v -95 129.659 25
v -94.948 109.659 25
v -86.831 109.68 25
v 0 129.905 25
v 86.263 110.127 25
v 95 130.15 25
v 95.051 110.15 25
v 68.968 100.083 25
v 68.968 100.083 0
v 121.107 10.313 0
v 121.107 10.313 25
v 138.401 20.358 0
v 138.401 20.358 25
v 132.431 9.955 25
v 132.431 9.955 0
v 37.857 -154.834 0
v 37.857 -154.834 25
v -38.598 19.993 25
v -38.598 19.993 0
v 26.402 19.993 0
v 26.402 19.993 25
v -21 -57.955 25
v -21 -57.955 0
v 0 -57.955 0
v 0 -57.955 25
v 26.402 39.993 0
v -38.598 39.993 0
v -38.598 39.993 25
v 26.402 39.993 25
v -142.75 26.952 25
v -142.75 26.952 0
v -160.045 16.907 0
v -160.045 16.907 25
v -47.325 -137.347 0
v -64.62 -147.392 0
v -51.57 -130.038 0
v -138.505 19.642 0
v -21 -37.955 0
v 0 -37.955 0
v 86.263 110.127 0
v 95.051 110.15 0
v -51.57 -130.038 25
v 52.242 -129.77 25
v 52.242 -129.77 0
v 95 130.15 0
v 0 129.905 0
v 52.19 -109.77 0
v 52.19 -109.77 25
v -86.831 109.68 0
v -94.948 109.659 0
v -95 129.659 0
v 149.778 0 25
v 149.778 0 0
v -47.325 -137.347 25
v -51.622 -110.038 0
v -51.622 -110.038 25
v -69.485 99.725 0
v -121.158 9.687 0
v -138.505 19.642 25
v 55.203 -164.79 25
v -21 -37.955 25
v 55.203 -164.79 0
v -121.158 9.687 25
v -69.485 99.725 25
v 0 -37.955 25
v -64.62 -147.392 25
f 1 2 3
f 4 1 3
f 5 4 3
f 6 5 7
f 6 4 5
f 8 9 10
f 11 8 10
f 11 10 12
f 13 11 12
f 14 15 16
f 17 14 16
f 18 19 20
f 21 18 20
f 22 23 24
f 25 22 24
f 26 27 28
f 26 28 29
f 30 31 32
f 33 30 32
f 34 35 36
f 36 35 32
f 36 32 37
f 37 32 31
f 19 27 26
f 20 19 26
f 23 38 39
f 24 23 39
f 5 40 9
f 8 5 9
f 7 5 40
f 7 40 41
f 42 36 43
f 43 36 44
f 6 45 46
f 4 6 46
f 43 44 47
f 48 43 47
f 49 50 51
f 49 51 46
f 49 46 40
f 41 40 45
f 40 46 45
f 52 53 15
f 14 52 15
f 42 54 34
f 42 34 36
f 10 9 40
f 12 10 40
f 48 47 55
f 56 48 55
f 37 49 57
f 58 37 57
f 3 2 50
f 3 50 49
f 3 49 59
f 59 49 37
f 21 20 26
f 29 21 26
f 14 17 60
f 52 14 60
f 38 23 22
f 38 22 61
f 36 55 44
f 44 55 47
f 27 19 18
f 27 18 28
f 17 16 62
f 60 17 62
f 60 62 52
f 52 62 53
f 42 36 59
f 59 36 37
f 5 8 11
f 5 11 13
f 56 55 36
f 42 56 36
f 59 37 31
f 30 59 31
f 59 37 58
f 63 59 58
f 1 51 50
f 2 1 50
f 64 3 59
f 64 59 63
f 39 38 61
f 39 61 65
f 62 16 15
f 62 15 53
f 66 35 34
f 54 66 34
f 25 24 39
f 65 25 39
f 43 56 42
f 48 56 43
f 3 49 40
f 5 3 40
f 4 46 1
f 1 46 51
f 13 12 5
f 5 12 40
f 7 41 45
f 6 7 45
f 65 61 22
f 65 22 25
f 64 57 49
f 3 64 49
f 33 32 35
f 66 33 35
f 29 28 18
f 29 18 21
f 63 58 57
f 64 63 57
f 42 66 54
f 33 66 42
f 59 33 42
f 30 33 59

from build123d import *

# Parameters (mm, degrees)
F1_DEPTH = 25
F2_DEPTH = 25
F0_W     = 65
F0_H     = 20
F3_DEPTH = 25
F0_W_2   = 21


# Not quite as in the source:
# - a feature names something its author has since deleted; it is built from what else it names


with BuildPart() as f1:
    # F0 (on Top) → F1 (new body)
    with BuildSketch(Plane.XY):
        Polygon((-69.4846216079, 99.7250617094), (-86.8309071217, 109.6802803847), (-138.504703636, 19.6422352991), (-121.1584181221, 9.6870166238), align=None)
    extrude(amount=F1_DEPTH)


with BuildPart() as f1b:
    # F0 (on Top) → F1, piece 2 (new body)
    with BuildSketch(Plane.XY):
        Polygon((94.9996829561, 130.1501124276), (0, 129.9046776291), (-94.9996829561, 129.6592428305), (-94.9480124722, 109.6593095766), (-86.8309071217, 109.6802803847), (-63.7681405371, 109.739863799), (86.2630265741, 110.1274742428), (95.05135344, 110.1501791737), align=None)
    extrude(amount=F1_DEPTH)


with BuildPart() as f1c:
    # F0 (on Top) → F1, piece 3 (new body)
    with BuildSketch(Plane.XY):
        Polygon((138.4013626682, 20.3576312087), (86.2630265741, 110.1274742428), (68.9684115442, 100.0827596642), (121.1067476382, 10.3129166301), align=None)
    extrude(amount=F1_DEPTH)


with BuildPart() as f1d:
    # F0 (on Top) → F1, piece 4 (new body)
    with BuildSketch(Plane.XY):
        Polygon((-51.6221260304, -110.0379783395), (-51.5704555465, -130.0379115934), (52.2416770618, -129.769709542), (52.1900065779, -109.769776288), align=None)
    extrude(amount=F1_DEPTH)


with BuildPart() as f1e:
    # F0 (on Top) → F1, piece 5 (new body)
    with BuildSketch(Plane.XY):
        Polygon((-51.5704555465, -130.0379115934), (-138.504703636, 19.6422352991), (-142.7499738398, 26.951583245), (-160.0445888697, 16.9068686664), (-112.3321946212, -65.2425527258), (-64.6198003726, -147.391974118), (-47.3251853427, -137.3472595393), align=None)
    extrude(amount=F1_DEPTH)


with BuildPart() as f2:
    # F0 (on Top) → F2 (new body)
    with BuildSketch(Plane.XY):
        Polygon((132.4313069212, 9.9552186753), (52.2416770618, -129.769709542), (37.8567295061, -154.8344937062), (55.2030150199, -164.7897123814), (102.4903037275, -82.3948561907), (149.7775924351, 0), align=None)
    extrude(amount=F2_DEPTH)


with BuildPart() as f3:
    # F0 (on Top) → F3 (new body)
    with BuildSketch(Plane.XY):
        with Locations((-6.0981351137, 29.9933182448)):
            Rectangle(F0_W, F0_H)
    extrude(amount=F3_DEPTH)


with BuildPart() as f3b:
    # F0 (on Top) → F3, piece 2 (new body)
    with BuildSketch(Plane.XY):
        with Locations((-10.5, -47.9548701644)):
            Rectangle(F0_W_2, F0_H)
    extrude(amount=F3_DEPTH)


solid = Compound([f1.part, f1b.part, f1c.part, f1d.part, f1e.part, f2.part, f3.part, f3b.part])
